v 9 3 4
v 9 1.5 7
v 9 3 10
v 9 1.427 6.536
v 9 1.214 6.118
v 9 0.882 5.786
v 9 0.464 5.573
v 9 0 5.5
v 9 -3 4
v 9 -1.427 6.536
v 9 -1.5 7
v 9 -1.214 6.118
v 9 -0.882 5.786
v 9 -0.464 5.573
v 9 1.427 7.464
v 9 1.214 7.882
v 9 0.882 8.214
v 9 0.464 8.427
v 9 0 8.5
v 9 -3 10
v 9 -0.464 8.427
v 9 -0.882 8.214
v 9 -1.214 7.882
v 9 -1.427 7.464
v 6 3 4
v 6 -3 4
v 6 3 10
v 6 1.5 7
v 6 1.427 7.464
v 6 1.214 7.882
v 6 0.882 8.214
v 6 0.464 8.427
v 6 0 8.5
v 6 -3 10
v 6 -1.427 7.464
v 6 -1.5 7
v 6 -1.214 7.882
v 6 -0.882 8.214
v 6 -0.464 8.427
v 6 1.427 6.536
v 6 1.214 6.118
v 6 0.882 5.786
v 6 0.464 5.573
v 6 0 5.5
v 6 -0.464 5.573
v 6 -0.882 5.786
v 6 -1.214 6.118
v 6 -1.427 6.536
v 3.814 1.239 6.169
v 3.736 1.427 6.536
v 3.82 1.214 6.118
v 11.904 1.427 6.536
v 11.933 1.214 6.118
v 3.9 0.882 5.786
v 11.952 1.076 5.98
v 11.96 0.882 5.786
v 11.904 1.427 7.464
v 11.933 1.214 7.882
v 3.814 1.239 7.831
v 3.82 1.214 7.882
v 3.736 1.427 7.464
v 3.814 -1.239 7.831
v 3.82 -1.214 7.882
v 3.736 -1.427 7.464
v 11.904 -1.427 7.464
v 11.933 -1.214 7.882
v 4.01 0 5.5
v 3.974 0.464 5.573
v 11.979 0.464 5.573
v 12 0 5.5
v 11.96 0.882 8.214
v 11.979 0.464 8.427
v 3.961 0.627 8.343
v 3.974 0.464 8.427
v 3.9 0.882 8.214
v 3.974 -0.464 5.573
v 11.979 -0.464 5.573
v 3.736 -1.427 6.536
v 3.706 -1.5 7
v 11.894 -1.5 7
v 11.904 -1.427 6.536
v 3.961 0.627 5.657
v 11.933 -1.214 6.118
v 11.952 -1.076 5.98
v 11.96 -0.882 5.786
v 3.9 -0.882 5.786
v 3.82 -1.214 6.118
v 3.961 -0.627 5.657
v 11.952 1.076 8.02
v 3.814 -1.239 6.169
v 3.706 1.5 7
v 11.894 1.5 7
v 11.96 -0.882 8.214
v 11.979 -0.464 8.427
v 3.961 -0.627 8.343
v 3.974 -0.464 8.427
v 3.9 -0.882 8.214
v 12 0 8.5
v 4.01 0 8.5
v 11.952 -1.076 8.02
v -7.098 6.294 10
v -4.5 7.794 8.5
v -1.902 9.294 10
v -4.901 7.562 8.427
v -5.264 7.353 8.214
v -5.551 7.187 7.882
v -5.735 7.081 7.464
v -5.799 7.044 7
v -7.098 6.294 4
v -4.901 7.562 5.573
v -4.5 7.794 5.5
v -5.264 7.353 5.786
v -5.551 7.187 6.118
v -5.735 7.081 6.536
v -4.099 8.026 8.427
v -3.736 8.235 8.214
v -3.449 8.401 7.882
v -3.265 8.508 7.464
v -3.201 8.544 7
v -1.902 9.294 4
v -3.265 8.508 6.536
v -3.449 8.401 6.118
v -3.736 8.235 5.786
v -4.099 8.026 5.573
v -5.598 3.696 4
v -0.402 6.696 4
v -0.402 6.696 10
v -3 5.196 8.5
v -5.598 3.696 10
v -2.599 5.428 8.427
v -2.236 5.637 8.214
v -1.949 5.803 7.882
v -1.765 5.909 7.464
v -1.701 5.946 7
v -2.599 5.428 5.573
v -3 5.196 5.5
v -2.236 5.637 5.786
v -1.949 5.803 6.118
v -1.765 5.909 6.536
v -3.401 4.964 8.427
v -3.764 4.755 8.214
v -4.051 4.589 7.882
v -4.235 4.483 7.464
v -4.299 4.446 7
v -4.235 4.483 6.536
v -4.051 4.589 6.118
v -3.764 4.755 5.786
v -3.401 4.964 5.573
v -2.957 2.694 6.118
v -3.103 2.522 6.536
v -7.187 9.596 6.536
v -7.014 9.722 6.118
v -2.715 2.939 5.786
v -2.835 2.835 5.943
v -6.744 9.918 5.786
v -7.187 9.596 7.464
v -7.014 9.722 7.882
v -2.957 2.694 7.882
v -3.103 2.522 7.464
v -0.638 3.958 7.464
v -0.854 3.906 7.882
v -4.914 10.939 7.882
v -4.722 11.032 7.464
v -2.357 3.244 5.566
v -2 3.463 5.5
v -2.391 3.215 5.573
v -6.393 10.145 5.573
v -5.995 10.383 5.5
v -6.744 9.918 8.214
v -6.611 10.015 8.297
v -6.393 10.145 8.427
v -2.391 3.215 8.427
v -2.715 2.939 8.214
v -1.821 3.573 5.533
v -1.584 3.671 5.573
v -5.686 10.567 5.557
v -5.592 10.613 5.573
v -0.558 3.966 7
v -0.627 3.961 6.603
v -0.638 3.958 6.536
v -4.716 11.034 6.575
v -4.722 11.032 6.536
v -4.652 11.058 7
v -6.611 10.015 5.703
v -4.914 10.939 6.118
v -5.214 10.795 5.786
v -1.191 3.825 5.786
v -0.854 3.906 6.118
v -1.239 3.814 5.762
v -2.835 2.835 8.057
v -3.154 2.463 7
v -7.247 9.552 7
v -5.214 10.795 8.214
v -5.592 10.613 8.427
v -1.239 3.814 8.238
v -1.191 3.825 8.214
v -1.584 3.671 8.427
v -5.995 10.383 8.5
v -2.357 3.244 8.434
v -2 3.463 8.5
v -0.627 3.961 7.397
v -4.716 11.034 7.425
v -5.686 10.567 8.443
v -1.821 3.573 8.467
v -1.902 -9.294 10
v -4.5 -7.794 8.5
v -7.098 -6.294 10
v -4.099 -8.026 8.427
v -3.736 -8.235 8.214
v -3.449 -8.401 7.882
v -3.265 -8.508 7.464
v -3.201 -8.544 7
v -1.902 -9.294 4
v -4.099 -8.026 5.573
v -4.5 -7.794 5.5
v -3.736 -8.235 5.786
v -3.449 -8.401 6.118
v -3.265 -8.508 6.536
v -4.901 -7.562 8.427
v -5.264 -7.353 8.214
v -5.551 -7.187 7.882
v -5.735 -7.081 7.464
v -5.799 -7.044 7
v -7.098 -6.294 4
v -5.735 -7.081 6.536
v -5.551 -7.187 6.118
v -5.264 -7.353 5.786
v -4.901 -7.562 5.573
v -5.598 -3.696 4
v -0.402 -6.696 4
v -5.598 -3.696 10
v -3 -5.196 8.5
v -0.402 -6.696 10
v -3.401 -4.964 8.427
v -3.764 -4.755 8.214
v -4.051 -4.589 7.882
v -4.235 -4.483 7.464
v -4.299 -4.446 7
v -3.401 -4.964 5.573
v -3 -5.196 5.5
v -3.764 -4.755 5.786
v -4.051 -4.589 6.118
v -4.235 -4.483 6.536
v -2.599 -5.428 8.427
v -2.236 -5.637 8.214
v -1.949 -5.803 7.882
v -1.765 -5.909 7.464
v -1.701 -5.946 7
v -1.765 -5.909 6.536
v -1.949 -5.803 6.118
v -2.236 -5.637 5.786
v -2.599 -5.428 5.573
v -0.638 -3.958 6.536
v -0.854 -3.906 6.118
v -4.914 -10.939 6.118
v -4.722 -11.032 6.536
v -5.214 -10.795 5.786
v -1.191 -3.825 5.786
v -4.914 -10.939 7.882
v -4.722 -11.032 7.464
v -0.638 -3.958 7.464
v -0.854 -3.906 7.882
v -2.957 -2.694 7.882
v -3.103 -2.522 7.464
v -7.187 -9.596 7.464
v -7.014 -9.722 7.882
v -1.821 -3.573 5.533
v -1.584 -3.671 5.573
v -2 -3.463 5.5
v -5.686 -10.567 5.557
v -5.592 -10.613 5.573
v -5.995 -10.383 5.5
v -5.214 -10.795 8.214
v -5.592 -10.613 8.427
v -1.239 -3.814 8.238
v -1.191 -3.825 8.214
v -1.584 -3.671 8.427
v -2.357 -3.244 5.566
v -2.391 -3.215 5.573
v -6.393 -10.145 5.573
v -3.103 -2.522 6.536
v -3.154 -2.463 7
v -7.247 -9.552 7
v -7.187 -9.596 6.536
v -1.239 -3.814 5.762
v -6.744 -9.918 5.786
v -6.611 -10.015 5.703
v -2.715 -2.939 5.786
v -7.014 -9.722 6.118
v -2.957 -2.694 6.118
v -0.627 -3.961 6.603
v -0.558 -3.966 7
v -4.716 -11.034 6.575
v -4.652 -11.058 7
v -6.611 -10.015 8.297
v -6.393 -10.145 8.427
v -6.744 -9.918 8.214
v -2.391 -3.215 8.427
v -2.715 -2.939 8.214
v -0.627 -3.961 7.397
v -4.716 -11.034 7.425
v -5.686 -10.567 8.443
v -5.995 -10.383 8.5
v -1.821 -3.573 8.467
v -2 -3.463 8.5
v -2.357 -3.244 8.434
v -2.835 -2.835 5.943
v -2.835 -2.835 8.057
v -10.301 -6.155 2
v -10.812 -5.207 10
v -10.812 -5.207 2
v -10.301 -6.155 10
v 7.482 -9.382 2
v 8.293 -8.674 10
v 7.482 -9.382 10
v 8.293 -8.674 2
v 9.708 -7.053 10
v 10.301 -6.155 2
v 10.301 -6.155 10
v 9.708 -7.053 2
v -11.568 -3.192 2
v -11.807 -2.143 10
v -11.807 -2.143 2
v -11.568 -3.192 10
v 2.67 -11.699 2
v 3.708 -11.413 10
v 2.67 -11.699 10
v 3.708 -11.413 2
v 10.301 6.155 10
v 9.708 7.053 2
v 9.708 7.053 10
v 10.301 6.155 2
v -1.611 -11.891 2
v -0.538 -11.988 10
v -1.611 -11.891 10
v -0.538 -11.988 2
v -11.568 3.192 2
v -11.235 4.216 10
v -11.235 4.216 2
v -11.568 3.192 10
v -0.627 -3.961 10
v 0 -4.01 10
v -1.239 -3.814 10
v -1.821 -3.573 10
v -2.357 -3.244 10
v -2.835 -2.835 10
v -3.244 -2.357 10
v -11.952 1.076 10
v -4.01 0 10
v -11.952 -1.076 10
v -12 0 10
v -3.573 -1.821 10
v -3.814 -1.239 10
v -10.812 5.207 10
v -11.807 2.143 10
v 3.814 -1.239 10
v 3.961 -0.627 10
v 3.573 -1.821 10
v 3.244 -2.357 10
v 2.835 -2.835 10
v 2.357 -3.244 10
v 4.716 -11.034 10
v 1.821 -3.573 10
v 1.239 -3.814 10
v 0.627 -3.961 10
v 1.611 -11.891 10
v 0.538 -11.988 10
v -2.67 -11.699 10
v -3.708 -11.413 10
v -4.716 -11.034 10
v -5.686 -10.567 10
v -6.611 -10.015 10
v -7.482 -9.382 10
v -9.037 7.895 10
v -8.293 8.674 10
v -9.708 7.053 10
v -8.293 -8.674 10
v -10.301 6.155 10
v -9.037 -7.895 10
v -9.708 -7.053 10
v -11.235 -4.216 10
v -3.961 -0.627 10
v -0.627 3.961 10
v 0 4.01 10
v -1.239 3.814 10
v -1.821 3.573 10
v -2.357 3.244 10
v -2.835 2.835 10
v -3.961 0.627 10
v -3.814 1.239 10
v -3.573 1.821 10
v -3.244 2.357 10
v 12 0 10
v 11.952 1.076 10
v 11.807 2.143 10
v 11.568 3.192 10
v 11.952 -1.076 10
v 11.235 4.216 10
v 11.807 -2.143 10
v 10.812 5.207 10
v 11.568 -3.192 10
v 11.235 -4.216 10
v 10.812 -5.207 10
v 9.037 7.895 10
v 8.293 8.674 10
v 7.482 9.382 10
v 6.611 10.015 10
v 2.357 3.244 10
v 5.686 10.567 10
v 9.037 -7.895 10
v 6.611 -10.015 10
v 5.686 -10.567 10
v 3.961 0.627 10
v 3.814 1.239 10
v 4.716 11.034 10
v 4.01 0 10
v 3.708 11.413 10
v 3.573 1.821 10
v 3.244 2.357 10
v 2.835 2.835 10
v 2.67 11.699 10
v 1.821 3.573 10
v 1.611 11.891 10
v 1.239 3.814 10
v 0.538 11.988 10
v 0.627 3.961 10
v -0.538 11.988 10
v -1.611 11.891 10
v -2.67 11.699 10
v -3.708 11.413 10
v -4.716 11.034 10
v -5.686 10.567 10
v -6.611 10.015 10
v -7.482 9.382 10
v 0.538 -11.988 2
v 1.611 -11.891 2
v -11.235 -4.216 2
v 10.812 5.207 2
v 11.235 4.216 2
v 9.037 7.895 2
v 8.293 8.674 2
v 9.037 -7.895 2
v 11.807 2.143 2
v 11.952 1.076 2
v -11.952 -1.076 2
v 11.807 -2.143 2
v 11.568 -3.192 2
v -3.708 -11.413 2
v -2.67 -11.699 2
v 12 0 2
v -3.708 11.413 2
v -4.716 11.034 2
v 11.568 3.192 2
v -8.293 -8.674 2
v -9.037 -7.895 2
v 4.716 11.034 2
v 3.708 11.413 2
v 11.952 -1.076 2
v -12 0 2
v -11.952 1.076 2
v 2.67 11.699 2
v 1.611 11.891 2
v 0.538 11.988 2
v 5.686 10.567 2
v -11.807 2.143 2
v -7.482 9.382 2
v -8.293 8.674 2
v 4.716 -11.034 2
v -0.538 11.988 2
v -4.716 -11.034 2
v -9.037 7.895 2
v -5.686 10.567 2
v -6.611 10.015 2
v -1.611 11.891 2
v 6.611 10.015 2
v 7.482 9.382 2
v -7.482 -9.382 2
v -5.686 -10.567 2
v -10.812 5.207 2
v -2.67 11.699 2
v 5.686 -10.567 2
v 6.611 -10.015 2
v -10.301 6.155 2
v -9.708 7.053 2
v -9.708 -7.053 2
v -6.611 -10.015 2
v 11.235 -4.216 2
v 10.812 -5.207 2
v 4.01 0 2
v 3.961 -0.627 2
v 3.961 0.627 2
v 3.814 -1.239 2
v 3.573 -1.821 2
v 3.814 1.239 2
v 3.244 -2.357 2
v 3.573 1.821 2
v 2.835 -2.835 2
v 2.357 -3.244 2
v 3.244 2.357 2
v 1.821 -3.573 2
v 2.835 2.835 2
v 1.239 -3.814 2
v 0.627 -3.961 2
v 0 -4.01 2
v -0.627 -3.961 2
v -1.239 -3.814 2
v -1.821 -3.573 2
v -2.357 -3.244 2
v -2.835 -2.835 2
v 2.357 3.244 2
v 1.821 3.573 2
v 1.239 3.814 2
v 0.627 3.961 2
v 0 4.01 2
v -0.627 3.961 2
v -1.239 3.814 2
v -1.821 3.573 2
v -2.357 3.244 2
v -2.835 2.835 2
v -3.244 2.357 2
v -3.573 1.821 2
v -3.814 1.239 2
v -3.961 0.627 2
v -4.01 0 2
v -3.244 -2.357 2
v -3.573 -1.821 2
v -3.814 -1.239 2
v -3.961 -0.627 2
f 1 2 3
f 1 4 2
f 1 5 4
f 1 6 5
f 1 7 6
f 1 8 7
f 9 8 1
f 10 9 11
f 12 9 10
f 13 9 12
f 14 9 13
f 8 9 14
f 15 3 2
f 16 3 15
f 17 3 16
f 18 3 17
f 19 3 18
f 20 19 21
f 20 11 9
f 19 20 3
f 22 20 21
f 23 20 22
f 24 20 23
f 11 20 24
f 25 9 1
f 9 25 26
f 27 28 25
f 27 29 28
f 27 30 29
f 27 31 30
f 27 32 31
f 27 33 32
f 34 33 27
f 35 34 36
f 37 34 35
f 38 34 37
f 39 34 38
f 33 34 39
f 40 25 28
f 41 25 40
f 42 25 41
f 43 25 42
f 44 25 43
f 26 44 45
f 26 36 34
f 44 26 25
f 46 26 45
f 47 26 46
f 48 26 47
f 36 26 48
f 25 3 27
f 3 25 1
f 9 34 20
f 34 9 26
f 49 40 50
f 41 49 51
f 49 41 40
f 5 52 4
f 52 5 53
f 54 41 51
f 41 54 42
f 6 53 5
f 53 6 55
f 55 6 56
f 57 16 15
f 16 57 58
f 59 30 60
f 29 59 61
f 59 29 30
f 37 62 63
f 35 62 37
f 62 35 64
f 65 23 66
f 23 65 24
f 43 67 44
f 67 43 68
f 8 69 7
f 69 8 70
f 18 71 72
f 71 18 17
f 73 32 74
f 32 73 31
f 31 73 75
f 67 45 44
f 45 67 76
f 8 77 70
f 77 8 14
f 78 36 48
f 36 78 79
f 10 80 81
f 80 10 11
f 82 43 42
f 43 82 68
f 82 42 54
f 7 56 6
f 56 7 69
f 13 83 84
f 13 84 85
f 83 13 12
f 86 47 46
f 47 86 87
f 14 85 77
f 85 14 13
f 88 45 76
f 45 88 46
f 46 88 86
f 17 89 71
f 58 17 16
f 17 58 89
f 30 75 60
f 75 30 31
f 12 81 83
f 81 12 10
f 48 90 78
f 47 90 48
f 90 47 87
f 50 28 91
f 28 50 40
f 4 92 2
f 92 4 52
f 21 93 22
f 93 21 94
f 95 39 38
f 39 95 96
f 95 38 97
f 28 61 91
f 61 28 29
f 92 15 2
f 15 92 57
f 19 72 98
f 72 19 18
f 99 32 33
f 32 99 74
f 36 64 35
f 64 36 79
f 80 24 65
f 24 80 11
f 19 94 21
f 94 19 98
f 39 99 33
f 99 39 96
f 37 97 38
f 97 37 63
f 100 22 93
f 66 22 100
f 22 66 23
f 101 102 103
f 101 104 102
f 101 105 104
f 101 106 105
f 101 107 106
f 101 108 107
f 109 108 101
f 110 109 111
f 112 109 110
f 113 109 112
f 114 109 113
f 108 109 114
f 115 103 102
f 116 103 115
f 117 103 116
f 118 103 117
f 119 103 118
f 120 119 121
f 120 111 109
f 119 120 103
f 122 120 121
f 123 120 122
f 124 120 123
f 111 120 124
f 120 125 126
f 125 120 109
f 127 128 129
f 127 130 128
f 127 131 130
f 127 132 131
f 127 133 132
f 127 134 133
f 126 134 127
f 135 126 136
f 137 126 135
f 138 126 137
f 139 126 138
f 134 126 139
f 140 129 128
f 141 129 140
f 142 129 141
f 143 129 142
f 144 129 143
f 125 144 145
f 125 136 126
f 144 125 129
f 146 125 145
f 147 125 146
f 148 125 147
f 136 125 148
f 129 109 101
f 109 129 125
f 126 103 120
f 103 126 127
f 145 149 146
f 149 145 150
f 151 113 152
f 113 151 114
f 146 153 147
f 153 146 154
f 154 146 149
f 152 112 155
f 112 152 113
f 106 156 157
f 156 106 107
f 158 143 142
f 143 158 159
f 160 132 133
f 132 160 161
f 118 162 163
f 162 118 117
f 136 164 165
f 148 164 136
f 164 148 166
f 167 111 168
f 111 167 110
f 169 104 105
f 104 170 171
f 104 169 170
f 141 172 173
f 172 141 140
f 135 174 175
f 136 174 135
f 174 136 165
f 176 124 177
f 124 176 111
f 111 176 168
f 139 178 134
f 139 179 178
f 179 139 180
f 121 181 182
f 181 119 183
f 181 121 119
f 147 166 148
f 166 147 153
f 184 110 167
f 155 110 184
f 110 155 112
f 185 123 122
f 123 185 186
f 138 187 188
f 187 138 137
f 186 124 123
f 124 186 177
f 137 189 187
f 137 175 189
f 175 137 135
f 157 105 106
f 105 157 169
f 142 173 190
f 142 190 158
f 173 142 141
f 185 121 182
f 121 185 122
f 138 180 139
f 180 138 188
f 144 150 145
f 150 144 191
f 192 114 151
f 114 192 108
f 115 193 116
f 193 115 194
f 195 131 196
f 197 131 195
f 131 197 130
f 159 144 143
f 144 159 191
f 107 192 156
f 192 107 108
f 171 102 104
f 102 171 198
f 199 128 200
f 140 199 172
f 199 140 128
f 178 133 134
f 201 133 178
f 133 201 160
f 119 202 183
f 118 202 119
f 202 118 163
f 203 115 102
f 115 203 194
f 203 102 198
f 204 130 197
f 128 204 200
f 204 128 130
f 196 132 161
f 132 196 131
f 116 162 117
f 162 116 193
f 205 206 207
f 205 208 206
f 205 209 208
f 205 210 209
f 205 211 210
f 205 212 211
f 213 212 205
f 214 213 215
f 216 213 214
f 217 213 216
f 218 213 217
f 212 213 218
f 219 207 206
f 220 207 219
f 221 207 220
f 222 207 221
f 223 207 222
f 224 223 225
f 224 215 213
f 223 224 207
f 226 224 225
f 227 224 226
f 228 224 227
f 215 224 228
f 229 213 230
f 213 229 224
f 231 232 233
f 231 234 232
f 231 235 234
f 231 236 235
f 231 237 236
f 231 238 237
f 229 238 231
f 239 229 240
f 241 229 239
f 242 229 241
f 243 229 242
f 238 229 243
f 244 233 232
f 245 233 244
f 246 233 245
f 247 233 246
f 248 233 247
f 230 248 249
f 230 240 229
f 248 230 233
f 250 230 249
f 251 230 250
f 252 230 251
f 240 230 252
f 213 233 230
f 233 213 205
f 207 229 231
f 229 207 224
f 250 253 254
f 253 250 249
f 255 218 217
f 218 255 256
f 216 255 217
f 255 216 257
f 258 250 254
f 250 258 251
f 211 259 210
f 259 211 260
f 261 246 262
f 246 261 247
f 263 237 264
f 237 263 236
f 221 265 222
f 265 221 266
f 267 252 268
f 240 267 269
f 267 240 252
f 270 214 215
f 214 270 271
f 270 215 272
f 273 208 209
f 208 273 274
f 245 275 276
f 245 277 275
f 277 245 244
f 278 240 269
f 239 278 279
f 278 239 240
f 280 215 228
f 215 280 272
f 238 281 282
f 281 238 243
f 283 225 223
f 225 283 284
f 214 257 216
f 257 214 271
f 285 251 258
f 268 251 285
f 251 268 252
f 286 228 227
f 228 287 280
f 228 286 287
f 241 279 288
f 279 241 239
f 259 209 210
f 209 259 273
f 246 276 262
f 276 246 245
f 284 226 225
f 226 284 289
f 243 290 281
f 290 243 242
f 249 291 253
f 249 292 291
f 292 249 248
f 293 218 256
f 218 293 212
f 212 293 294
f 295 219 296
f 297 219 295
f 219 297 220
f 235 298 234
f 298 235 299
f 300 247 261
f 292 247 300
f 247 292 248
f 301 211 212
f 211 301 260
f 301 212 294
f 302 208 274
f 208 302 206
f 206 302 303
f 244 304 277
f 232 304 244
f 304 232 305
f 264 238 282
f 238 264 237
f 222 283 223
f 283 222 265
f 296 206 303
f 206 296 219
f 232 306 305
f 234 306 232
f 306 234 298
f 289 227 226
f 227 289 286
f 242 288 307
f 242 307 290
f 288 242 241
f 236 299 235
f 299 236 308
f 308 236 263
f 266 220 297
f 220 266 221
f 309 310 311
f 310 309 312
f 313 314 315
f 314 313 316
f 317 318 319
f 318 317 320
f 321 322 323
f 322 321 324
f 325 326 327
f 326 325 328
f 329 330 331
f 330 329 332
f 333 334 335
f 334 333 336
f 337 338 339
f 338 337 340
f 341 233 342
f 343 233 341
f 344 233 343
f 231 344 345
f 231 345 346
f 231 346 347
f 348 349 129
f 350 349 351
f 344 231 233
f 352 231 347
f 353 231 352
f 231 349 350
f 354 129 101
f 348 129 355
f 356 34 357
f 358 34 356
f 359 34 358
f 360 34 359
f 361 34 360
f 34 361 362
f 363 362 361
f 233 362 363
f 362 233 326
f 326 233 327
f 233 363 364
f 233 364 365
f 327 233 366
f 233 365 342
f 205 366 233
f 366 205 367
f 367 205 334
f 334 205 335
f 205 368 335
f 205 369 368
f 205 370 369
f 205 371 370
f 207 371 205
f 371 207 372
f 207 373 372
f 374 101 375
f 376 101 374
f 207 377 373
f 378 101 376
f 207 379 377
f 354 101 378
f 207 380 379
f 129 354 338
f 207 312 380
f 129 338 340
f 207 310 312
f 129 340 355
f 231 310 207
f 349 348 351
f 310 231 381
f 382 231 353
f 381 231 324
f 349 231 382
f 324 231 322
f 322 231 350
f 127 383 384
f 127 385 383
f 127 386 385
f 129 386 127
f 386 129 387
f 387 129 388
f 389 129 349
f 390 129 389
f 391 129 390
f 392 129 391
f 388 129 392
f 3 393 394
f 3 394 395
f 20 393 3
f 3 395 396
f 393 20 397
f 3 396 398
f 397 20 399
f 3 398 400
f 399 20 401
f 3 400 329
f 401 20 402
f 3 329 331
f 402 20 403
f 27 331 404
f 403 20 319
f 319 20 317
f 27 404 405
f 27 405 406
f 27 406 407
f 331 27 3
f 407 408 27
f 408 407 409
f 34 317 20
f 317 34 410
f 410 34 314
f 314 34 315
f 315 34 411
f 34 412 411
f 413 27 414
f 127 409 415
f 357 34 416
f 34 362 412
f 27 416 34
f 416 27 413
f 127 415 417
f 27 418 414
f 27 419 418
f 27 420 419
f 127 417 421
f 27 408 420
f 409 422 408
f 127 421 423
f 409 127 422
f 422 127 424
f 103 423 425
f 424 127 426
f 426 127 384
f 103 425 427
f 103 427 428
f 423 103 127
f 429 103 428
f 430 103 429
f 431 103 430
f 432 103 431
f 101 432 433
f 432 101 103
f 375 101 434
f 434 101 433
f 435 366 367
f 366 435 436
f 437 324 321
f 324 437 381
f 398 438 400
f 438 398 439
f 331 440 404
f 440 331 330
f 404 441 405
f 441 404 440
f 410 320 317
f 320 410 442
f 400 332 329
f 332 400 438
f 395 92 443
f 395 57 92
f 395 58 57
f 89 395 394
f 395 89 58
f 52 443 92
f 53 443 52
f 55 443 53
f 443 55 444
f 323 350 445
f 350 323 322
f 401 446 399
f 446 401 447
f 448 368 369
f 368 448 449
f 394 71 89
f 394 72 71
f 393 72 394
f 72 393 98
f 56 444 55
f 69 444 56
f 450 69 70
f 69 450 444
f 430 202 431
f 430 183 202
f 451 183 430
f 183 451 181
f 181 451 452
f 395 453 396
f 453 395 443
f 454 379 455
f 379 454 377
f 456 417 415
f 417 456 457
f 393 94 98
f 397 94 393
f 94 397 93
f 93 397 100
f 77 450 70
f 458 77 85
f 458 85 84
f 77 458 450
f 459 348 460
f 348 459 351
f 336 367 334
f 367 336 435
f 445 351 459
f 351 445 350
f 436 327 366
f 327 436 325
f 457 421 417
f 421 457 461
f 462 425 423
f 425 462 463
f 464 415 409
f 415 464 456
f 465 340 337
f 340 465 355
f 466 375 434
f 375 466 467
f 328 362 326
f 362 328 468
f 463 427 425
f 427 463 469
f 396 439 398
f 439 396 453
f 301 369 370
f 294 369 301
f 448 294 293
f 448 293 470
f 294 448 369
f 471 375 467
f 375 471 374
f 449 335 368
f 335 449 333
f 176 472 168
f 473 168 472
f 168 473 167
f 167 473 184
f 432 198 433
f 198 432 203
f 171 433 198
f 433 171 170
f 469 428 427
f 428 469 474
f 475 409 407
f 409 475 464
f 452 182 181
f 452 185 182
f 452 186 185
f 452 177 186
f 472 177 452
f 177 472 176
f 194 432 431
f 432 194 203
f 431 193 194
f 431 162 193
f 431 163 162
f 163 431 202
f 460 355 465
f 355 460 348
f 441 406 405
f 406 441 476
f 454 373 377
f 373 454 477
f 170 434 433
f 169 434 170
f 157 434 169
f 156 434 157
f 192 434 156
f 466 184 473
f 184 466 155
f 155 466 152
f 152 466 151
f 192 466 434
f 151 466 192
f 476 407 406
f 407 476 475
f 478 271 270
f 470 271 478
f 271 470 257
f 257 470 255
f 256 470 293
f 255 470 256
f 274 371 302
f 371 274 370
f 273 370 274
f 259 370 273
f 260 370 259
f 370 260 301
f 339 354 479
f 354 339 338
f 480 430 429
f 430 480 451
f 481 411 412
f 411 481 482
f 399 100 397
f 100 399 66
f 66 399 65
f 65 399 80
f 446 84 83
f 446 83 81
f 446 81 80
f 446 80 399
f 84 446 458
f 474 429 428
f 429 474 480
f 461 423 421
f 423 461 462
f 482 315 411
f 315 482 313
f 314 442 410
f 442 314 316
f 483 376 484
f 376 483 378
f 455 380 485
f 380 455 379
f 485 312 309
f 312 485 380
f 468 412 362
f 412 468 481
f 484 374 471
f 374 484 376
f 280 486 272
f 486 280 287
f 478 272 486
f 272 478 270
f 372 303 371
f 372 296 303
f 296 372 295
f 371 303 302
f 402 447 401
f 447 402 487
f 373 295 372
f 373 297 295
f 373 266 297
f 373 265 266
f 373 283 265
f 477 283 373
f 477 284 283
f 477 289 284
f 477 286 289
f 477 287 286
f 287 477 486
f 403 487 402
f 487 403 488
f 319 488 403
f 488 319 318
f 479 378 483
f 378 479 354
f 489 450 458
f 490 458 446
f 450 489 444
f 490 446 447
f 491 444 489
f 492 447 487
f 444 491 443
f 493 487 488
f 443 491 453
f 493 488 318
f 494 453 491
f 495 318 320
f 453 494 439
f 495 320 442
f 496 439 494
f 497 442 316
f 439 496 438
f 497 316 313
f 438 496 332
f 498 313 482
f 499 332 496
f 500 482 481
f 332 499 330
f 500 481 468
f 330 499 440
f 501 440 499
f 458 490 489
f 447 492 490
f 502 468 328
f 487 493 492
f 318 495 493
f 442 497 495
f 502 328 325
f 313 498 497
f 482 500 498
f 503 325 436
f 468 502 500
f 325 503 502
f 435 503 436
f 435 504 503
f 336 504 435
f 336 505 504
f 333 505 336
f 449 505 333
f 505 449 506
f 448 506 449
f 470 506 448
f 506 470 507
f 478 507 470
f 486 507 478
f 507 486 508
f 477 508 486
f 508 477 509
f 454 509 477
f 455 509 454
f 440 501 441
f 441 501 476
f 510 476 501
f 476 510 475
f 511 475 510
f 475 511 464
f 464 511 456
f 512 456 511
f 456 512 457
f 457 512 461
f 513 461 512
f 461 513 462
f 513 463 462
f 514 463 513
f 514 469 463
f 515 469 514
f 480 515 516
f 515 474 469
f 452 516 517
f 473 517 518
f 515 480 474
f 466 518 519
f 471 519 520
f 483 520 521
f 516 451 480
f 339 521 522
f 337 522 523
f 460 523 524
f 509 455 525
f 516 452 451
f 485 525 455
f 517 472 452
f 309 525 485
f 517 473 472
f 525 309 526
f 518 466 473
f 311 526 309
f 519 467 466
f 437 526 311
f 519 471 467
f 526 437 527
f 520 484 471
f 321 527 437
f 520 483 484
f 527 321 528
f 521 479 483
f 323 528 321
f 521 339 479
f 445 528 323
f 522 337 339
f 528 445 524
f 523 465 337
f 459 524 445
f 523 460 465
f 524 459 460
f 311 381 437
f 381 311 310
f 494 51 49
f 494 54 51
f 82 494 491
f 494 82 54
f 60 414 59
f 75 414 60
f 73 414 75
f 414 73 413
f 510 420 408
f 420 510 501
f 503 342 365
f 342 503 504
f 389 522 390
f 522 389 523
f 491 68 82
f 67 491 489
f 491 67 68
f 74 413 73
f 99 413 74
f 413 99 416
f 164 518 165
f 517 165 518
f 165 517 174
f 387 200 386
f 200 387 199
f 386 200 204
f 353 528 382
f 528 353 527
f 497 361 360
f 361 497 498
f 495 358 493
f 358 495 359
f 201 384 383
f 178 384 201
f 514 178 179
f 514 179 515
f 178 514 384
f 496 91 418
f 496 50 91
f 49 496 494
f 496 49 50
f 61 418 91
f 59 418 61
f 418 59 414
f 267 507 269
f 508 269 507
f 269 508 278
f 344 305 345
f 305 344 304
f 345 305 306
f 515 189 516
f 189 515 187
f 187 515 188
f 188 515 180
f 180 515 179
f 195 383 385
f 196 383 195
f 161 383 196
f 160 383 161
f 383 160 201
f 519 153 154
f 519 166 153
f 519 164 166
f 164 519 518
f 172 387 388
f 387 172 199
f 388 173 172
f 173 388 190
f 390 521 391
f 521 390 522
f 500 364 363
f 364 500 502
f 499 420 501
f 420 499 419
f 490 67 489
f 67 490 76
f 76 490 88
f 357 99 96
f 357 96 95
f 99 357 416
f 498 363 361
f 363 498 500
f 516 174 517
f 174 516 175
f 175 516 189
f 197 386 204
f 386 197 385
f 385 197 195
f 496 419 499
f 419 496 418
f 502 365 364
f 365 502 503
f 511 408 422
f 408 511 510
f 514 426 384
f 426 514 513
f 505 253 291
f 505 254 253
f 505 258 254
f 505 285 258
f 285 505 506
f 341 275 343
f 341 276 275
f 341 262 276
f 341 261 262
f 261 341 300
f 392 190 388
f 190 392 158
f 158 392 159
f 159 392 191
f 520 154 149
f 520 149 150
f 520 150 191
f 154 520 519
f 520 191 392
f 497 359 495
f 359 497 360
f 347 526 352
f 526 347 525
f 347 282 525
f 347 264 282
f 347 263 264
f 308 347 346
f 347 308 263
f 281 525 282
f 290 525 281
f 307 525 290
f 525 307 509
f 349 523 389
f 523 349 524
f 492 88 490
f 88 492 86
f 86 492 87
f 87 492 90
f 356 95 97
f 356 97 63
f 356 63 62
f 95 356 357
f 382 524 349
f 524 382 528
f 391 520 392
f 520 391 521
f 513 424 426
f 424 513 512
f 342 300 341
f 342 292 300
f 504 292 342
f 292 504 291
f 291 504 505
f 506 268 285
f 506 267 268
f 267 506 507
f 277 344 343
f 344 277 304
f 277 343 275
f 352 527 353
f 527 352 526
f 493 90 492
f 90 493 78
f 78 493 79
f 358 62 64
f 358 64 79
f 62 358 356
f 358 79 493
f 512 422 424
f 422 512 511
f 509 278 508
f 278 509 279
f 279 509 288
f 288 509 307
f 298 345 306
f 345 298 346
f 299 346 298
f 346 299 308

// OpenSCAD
thrust=[10,24,9];
%cylinder(d=8,h=100,$fn=40);
//*
mirror([0,0,1]) linear_extrude(20,convexity=3) difference() {
  circle(d=5,$fn=25);
  translate([2,-2]) square([2,4]);
}
%translate([0,0,-12]) cylinder(d=19,h=24,$fn=70);
translate([0,0,13]) linear_extrude(7,convexity=3) difference() {
  circle(d=22,$fn=80);
  circle(d=8,$fn=40);
}
//*/
color("gold") translate([0,0,24]) linear_extrude(thrust[2],convexity=3) difference() {
  circle(d=thrust[1],$fn=80);
  circle(d=thrust[0],$fn=50);
}

translate([0,0,22.2+thrust[2]]) {
  color("gray") !difference() {
    union() {
      translate([0,0,2]) cylinder(d=24,h=8,$fn=70);
      *translate([0,0,-3])
        cylinder(d=8.6,h=1,$fn=40);
      *translate([0,0,-2])
        cylinder(d1=8.6,d2=thrust[2],h=2,$fn=40);
    }
    translate([0,0,-4.02]) cylinder(d=8.02,h=20,$fn=40);
    for(r=[0:120:359]) rotate([0,0,r]) {
      translate([6,-3,10-6]) cube([3,6,6.02]);
      translate([0,0,10-3]) rotate([0,90]) cylinder(d=3,h=20,$fn=20);
    }
  }
}
